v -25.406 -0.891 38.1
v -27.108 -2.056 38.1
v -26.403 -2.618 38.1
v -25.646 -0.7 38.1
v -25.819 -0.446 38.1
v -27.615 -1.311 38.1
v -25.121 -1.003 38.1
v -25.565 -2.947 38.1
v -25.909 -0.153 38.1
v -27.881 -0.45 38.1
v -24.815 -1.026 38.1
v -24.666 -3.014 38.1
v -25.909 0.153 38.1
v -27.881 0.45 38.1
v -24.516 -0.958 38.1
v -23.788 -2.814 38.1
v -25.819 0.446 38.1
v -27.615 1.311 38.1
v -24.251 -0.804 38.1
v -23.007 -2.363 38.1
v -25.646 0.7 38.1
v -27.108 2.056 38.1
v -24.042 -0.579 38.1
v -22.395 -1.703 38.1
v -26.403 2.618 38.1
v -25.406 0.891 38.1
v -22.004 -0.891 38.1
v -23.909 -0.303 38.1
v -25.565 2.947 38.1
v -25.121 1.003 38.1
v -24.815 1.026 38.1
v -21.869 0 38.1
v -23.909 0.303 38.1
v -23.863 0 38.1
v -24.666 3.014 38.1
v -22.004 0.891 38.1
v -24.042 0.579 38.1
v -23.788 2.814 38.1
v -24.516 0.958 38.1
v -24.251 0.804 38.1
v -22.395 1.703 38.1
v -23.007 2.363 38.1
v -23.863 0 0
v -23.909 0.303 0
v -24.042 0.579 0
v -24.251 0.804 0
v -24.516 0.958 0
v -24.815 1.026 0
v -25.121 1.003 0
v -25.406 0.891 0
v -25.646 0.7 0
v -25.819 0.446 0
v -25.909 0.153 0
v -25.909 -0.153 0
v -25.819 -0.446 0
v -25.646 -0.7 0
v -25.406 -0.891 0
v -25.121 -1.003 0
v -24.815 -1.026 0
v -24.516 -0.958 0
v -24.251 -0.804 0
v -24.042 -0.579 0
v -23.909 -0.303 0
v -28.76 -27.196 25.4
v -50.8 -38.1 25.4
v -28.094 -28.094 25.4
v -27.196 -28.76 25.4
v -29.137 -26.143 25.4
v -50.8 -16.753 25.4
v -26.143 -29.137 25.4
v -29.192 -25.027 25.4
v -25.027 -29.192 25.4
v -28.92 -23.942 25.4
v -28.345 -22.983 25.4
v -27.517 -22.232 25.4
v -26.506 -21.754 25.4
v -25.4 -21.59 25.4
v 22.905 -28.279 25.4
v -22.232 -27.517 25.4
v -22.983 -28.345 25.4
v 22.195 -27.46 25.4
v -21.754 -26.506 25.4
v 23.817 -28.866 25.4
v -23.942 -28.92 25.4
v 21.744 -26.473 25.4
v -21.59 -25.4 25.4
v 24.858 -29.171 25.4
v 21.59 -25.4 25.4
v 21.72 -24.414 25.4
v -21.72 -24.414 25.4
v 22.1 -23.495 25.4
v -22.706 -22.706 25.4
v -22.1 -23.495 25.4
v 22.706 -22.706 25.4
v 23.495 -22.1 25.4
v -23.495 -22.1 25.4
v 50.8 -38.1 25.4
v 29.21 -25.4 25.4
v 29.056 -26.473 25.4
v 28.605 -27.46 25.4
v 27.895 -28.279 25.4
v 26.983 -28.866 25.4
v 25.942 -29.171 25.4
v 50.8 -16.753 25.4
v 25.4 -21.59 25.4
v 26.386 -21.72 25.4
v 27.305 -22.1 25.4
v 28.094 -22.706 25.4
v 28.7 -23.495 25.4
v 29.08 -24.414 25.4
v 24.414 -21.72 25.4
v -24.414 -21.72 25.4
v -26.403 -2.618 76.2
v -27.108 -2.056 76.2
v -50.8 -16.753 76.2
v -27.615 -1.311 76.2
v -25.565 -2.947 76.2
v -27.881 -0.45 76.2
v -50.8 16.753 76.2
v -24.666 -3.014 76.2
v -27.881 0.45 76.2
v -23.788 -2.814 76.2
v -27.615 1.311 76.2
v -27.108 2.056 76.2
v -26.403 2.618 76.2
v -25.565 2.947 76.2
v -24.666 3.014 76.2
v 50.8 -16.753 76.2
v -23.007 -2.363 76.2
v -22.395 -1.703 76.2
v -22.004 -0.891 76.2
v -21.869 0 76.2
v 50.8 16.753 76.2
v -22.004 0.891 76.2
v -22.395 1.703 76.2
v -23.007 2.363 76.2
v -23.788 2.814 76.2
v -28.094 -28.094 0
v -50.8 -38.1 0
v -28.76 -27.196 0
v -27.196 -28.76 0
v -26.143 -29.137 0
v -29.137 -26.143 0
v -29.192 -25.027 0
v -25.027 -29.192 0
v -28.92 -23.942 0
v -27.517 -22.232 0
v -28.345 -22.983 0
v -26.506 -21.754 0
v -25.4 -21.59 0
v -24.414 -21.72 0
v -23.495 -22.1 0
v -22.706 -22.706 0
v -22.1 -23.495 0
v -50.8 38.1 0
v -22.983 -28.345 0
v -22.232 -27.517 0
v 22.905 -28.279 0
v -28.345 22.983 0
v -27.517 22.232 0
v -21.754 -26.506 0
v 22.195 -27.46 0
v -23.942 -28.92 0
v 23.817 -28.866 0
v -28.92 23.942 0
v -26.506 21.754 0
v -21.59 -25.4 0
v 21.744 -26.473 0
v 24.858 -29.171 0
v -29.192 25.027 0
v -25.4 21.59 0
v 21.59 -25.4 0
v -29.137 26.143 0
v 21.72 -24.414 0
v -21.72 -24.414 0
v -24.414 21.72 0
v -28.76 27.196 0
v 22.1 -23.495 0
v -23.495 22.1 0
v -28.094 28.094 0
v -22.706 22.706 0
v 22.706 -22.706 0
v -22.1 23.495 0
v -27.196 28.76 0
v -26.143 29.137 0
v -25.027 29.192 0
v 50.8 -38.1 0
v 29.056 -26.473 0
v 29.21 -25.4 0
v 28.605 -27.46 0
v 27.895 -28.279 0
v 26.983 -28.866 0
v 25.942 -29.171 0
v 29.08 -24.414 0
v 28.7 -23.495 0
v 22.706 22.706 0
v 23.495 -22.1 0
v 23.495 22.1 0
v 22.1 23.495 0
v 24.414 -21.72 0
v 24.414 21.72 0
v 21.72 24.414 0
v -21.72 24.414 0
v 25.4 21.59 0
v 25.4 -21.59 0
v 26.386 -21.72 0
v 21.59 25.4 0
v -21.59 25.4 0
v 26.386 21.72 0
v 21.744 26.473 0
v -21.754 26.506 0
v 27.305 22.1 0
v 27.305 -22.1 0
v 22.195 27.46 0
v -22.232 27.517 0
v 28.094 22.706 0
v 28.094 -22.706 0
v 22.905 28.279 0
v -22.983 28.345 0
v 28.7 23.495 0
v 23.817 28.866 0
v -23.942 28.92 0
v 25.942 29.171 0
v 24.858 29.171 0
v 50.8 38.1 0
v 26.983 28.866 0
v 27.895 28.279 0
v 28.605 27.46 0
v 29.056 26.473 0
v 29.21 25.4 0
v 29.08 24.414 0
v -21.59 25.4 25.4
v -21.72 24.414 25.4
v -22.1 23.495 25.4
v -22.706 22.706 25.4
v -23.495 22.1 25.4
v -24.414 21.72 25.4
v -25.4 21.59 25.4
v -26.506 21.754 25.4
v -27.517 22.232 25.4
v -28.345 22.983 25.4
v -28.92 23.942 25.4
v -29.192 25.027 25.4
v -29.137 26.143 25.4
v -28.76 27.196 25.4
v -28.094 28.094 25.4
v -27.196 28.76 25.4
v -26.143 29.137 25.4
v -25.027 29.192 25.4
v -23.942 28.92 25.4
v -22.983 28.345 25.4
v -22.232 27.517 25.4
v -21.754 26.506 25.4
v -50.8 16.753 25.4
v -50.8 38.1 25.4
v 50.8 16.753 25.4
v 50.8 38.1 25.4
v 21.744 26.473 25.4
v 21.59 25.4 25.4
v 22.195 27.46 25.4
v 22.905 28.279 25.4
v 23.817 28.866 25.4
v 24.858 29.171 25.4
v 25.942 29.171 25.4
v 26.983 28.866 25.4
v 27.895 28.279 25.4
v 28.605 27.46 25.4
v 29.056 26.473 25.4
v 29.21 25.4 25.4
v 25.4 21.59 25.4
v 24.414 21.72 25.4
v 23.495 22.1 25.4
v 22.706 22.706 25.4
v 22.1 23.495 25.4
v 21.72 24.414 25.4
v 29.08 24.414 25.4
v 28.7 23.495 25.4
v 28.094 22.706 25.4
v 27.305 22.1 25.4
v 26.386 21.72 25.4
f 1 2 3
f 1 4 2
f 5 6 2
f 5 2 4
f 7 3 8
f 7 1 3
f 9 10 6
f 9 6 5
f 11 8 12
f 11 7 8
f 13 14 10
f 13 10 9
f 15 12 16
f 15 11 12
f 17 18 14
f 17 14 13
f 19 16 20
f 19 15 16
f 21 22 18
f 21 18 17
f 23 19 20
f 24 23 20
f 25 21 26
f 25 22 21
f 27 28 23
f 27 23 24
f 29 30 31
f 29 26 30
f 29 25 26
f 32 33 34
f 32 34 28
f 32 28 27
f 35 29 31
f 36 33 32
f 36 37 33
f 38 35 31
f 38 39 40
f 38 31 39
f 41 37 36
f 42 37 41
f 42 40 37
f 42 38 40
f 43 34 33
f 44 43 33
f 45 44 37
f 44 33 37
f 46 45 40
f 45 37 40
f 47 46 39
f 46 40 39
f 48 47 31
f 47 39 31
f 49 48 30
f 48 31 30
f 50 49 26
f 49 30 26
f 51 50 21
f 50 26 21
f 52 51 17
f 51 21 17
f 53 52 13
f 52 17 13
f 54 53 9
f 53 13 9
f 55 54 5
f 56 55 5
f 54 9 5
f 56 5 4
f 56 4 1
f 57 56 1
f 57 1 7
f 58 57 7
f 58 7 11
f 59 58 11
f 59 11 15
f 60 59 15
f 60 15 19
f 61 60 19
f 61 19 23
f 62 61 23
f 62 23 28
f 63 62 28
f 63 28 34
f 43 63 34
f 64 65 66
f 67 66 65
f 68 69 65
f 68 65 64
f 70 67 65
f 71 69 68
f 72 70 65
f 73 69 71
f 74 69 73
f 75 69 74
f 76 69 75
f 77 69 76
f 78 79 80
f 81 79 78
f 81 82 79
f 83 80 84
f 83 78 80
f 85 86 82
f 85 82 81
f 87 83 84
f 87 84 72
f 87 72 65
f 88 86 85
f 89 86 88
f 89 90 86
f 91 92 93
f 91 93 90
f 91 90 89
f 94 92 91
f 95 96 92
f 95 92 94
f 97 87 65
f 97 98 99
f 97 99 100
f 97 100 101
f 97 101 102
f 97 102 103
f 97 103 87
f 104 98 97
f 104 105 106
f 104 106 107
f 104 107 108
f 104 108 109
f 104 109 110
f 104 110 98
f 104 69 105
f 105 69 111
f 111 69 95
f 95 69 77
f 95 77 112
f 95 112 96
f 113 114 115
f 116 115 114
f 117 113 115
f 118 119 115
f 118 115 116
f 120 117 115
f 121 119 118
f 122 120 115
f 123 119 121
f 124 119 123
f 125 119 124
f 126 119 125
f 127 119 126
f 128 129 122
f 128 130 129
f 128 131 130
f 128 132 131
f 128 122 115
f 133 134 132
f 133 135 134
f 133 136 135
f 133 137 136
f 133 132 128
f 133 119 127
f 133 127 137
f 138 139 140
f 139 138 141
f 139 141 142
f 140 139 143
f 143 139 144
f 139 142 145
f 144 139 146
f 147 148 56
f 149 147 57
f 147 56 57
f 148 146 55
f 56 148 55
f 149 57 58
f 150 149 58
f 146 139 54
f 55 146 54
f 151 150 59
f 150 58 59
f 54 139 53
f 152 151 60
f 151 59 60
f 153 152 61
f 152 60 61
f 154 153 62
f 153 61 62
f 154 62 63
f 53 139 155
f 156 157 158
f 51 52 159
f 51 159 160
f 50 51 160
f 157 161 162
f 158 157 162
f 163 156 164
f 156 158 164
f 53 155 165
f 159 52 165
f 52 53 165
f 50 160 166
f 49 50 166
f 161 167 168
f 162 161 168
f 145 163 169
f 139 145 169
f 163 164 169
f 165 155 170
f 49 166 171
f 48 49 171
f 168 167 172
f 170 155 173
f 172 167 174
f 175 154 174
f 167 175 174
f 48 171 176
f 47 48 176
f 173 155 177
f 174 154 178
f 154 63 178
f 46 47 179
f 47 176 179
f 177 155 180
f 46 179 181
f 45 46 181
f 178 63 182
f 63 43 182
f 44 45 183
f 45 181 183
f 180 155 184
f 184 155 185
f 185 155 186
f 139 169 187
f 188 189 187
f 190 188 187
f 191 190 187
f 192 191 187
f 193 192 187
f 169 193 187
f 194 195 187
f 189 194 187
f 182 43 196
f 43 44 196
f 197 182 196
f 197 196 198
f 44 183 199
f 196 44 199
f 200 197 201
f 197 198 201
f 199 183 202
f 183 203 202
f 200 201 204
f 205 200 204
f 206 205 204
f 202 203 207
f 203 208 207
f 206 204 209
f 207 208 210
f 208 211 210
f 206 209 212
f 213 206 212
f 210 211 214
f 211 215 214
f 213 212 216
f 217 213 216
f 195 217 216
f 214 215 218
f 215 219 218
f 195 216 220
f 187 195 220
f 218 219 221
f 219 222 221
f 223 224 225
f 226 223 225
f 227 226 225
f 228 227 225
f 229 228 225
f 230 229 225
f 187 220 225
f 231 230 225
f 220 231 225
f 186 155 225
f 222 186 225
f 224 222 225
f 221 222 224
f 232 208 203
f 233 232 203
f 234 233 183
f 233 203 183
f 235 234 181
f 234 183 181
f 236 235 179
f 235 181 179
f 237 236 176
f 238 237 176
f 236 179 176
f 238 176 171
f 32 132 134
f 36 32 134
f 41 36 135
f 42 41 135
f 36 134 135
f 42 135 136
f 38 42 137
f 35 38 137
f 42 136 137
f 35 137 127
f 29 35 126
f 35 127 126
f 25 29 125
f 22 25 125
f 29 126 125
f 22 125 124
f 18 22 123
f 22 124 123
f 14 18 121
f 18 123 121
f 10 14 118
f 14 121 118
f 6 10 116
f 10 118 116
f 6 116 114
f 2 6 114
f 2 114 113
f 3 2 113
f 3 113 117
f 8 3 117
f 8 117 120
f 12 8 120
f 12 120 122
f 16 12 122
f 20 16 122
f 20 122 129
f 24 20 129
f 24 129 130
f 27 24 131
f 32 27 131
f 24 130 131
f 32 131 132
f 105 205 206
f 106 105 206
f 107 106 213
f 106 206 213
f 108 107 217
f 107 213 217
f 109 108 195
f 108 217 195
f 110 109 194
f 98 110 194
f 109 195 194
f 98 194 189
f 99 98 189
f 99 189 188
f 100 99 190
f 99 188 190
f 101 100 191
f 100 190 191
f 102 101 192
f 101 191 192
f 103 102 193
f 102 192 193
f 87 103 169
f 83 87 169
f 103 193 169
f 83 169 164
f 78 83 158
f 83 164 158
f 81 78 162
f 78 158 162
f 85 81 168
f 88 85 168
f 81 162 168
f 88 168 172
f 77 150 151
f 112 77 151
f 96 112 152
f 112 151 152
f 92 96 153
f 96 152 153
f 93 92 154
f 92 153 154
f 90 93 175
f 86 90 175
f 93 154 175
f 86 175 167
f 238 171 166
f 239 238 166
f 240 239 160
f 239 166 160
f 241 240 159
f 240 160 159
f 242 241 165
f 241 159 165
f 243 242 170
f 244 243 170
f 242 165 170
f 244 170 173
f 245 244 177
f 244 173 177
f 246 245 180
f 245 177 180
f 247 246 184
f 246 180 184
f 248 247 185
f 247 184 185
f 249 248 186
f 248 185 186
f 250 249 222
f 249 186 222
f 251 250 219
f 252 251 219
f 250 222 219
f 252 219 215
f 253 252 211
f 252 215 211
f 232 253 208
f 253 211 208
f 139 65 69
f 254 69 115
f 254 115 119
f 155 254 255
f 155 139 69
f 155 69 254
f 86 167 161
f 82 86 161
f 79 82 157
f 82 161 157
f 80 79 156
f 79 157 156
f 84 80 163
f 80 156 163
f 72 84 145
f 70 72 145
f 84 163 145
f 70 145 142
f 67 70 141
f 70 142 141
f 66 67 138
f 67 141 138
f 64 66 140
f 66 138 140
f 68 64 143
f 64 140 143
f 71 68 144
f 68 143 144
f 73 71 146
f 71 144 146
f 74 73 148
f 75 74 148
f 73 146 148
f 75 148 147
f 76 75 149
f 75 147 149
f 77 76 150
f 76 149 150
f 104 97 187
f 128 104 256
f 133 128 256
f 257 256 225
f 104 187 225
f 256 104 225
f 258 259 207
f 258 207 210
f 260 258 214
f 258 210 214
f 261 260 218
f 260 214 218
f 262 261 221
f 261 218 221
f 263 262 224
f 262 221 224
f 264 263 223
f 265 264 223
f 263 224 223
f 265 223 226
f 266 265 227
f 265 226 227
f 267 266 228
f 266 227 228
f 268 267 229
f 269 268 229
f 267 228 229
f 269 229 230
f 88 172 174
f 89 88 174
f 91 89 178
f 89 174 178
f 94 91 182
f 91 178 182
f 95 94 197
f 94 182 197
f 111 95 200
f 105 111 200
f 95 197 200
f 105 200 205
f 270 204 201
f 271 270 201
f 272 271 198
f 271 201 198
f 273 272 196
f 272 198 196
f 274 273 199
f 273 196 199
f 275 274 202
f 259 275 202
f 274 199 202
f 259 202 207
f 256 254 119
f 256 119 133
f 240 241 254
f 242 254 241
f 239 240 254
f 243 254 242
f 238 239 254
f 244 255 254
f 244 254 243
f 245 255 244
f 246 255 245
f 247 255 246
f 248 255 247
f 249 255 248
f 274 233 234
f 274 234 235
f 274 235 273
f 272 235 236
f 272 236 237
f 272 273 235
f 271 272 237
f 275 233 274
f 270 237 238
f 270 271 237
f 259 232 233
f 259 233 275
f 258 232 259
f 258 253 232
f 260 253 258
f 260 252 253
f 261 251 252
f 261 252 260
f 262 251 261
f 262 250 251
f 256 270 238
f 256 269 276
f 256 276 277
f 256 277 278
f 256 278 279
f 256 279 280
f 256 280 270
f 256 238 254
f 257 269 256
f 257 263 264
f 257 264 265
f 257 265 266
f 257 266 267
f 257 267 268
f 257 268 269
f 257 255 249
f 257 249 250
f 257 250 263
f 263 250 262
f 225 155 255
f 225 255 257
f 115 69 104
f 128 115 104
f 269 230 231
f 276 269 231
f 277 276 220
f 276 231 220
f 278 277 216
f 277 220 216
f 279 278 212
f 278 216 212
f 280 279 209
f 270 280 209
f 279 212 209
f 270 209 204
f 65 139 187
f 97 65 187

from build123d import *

# Parameters (mm, degrees)
F0_W     = 101.6
F0_H     = 76.2
F1_DEPTH = 25.4
F2_W     = 101.6
F2_H     = 33.5062108934
F3_DEPTH = 50.8
F4_R     = 1.0287
F5_DEPTH = 101.6
F6_R     = 3.0226
F6_R_2   = 1.0287
F7_DEPTH = 38.1


with BuildPart() as f1:
    # F0 (on Top) → F1 (new body)
    with BuildSketch(Plane.XY):
        Rectangle(F0_W, F0_H)
        with BuildLine():
            ThreePointArc((-25.4, 21.59), (-28.0940768363, 28.0940768363), (-21.59, 25.4))
            Line((-21.59, 25.4), (21.59, 25.4))
            ThreePointArc((21.59, 25.4), (25.4, 29.21), (29.21, 25.4))
            ThreePointArc((29.21, 25.4), (28.0940768363, 22.7059231637), (25.4, 21.59))
            Line((25.4, 21.59), (25.4, -21.59))
            ThreePointArc((25.4, -21.59), (28.0940768363, -22.7059231637), (29.21, -25.4))
            ThreePointArc((29.21, -25.4), (25.4, -29.21), (21.59, -25.4))
            Line((21.59, -25.4), (-21.59, -25.4))
            ThreePointArc((-21.59, -25.4), (-28.0940768363, -28.0940768363), (-25.4, -21.59))
            Line((-25.4, -21.59), (-25.4, 21.59))
        make_face(mode=Mode.SUBTRACT)
        with BuildLine():
            Line((21.59, 25.4), (-21.59, 25.4))
            ThreePointArc((-21.59, 25.4), (-22.7059231637, 22.7059231637), (-25.4, 21.59))
            Line((-25.4, 21.59), (-25.4, -21.59))
            ThreePointArc((-25.4, -21.59), (-22.7059231637, -22.7059231637), (-21.59, -25.4))
            Line((-21.59, -25.4), (21.59, -25.4))
            ThreePointArc((21.59, -25.4), (22.7059231637, -22.7059231637), (25.4, -21.59))
            Line((25.4, -21.59), (25.4, 21.59))
            ThreePointArc((25.4, 21.59), (22.7059231637, 22.7059231637), (21.59, 25.4))
        make_face()
    extrude(amount=F1_DEPTH)

    # F2 (on face) → F3 (join)
    with BuildSketch(Plane.XY.offset(25.4)):
        Rectangle(F2_W, F2_H)
    extrude(amount=F3_DEPTH)

    # F4 (on face) → F5 (cut)
    with BuildSketch(Plane.XY.offset(76.2)):
        with Locations((-24.892, 0)):
            Circle(F4_R)
    extrude(amount=-F5_DEPTH, mode=Mode.SUBTRACT)

    # F6 (on face) → F7 (cut)
    with BuildSketch(Plane.XY.offset(76.2)):
        with Locations((-24.892, 0)):
            Circle(F6_R)
        with Locations((-24.892, 0)):
            Circle(F6_R_2, mode=Mode.SUBTRACT)
    extrude(amount=-F7_DEPTH, mode=Mode.SUBTRACT)


solid = f1.part
